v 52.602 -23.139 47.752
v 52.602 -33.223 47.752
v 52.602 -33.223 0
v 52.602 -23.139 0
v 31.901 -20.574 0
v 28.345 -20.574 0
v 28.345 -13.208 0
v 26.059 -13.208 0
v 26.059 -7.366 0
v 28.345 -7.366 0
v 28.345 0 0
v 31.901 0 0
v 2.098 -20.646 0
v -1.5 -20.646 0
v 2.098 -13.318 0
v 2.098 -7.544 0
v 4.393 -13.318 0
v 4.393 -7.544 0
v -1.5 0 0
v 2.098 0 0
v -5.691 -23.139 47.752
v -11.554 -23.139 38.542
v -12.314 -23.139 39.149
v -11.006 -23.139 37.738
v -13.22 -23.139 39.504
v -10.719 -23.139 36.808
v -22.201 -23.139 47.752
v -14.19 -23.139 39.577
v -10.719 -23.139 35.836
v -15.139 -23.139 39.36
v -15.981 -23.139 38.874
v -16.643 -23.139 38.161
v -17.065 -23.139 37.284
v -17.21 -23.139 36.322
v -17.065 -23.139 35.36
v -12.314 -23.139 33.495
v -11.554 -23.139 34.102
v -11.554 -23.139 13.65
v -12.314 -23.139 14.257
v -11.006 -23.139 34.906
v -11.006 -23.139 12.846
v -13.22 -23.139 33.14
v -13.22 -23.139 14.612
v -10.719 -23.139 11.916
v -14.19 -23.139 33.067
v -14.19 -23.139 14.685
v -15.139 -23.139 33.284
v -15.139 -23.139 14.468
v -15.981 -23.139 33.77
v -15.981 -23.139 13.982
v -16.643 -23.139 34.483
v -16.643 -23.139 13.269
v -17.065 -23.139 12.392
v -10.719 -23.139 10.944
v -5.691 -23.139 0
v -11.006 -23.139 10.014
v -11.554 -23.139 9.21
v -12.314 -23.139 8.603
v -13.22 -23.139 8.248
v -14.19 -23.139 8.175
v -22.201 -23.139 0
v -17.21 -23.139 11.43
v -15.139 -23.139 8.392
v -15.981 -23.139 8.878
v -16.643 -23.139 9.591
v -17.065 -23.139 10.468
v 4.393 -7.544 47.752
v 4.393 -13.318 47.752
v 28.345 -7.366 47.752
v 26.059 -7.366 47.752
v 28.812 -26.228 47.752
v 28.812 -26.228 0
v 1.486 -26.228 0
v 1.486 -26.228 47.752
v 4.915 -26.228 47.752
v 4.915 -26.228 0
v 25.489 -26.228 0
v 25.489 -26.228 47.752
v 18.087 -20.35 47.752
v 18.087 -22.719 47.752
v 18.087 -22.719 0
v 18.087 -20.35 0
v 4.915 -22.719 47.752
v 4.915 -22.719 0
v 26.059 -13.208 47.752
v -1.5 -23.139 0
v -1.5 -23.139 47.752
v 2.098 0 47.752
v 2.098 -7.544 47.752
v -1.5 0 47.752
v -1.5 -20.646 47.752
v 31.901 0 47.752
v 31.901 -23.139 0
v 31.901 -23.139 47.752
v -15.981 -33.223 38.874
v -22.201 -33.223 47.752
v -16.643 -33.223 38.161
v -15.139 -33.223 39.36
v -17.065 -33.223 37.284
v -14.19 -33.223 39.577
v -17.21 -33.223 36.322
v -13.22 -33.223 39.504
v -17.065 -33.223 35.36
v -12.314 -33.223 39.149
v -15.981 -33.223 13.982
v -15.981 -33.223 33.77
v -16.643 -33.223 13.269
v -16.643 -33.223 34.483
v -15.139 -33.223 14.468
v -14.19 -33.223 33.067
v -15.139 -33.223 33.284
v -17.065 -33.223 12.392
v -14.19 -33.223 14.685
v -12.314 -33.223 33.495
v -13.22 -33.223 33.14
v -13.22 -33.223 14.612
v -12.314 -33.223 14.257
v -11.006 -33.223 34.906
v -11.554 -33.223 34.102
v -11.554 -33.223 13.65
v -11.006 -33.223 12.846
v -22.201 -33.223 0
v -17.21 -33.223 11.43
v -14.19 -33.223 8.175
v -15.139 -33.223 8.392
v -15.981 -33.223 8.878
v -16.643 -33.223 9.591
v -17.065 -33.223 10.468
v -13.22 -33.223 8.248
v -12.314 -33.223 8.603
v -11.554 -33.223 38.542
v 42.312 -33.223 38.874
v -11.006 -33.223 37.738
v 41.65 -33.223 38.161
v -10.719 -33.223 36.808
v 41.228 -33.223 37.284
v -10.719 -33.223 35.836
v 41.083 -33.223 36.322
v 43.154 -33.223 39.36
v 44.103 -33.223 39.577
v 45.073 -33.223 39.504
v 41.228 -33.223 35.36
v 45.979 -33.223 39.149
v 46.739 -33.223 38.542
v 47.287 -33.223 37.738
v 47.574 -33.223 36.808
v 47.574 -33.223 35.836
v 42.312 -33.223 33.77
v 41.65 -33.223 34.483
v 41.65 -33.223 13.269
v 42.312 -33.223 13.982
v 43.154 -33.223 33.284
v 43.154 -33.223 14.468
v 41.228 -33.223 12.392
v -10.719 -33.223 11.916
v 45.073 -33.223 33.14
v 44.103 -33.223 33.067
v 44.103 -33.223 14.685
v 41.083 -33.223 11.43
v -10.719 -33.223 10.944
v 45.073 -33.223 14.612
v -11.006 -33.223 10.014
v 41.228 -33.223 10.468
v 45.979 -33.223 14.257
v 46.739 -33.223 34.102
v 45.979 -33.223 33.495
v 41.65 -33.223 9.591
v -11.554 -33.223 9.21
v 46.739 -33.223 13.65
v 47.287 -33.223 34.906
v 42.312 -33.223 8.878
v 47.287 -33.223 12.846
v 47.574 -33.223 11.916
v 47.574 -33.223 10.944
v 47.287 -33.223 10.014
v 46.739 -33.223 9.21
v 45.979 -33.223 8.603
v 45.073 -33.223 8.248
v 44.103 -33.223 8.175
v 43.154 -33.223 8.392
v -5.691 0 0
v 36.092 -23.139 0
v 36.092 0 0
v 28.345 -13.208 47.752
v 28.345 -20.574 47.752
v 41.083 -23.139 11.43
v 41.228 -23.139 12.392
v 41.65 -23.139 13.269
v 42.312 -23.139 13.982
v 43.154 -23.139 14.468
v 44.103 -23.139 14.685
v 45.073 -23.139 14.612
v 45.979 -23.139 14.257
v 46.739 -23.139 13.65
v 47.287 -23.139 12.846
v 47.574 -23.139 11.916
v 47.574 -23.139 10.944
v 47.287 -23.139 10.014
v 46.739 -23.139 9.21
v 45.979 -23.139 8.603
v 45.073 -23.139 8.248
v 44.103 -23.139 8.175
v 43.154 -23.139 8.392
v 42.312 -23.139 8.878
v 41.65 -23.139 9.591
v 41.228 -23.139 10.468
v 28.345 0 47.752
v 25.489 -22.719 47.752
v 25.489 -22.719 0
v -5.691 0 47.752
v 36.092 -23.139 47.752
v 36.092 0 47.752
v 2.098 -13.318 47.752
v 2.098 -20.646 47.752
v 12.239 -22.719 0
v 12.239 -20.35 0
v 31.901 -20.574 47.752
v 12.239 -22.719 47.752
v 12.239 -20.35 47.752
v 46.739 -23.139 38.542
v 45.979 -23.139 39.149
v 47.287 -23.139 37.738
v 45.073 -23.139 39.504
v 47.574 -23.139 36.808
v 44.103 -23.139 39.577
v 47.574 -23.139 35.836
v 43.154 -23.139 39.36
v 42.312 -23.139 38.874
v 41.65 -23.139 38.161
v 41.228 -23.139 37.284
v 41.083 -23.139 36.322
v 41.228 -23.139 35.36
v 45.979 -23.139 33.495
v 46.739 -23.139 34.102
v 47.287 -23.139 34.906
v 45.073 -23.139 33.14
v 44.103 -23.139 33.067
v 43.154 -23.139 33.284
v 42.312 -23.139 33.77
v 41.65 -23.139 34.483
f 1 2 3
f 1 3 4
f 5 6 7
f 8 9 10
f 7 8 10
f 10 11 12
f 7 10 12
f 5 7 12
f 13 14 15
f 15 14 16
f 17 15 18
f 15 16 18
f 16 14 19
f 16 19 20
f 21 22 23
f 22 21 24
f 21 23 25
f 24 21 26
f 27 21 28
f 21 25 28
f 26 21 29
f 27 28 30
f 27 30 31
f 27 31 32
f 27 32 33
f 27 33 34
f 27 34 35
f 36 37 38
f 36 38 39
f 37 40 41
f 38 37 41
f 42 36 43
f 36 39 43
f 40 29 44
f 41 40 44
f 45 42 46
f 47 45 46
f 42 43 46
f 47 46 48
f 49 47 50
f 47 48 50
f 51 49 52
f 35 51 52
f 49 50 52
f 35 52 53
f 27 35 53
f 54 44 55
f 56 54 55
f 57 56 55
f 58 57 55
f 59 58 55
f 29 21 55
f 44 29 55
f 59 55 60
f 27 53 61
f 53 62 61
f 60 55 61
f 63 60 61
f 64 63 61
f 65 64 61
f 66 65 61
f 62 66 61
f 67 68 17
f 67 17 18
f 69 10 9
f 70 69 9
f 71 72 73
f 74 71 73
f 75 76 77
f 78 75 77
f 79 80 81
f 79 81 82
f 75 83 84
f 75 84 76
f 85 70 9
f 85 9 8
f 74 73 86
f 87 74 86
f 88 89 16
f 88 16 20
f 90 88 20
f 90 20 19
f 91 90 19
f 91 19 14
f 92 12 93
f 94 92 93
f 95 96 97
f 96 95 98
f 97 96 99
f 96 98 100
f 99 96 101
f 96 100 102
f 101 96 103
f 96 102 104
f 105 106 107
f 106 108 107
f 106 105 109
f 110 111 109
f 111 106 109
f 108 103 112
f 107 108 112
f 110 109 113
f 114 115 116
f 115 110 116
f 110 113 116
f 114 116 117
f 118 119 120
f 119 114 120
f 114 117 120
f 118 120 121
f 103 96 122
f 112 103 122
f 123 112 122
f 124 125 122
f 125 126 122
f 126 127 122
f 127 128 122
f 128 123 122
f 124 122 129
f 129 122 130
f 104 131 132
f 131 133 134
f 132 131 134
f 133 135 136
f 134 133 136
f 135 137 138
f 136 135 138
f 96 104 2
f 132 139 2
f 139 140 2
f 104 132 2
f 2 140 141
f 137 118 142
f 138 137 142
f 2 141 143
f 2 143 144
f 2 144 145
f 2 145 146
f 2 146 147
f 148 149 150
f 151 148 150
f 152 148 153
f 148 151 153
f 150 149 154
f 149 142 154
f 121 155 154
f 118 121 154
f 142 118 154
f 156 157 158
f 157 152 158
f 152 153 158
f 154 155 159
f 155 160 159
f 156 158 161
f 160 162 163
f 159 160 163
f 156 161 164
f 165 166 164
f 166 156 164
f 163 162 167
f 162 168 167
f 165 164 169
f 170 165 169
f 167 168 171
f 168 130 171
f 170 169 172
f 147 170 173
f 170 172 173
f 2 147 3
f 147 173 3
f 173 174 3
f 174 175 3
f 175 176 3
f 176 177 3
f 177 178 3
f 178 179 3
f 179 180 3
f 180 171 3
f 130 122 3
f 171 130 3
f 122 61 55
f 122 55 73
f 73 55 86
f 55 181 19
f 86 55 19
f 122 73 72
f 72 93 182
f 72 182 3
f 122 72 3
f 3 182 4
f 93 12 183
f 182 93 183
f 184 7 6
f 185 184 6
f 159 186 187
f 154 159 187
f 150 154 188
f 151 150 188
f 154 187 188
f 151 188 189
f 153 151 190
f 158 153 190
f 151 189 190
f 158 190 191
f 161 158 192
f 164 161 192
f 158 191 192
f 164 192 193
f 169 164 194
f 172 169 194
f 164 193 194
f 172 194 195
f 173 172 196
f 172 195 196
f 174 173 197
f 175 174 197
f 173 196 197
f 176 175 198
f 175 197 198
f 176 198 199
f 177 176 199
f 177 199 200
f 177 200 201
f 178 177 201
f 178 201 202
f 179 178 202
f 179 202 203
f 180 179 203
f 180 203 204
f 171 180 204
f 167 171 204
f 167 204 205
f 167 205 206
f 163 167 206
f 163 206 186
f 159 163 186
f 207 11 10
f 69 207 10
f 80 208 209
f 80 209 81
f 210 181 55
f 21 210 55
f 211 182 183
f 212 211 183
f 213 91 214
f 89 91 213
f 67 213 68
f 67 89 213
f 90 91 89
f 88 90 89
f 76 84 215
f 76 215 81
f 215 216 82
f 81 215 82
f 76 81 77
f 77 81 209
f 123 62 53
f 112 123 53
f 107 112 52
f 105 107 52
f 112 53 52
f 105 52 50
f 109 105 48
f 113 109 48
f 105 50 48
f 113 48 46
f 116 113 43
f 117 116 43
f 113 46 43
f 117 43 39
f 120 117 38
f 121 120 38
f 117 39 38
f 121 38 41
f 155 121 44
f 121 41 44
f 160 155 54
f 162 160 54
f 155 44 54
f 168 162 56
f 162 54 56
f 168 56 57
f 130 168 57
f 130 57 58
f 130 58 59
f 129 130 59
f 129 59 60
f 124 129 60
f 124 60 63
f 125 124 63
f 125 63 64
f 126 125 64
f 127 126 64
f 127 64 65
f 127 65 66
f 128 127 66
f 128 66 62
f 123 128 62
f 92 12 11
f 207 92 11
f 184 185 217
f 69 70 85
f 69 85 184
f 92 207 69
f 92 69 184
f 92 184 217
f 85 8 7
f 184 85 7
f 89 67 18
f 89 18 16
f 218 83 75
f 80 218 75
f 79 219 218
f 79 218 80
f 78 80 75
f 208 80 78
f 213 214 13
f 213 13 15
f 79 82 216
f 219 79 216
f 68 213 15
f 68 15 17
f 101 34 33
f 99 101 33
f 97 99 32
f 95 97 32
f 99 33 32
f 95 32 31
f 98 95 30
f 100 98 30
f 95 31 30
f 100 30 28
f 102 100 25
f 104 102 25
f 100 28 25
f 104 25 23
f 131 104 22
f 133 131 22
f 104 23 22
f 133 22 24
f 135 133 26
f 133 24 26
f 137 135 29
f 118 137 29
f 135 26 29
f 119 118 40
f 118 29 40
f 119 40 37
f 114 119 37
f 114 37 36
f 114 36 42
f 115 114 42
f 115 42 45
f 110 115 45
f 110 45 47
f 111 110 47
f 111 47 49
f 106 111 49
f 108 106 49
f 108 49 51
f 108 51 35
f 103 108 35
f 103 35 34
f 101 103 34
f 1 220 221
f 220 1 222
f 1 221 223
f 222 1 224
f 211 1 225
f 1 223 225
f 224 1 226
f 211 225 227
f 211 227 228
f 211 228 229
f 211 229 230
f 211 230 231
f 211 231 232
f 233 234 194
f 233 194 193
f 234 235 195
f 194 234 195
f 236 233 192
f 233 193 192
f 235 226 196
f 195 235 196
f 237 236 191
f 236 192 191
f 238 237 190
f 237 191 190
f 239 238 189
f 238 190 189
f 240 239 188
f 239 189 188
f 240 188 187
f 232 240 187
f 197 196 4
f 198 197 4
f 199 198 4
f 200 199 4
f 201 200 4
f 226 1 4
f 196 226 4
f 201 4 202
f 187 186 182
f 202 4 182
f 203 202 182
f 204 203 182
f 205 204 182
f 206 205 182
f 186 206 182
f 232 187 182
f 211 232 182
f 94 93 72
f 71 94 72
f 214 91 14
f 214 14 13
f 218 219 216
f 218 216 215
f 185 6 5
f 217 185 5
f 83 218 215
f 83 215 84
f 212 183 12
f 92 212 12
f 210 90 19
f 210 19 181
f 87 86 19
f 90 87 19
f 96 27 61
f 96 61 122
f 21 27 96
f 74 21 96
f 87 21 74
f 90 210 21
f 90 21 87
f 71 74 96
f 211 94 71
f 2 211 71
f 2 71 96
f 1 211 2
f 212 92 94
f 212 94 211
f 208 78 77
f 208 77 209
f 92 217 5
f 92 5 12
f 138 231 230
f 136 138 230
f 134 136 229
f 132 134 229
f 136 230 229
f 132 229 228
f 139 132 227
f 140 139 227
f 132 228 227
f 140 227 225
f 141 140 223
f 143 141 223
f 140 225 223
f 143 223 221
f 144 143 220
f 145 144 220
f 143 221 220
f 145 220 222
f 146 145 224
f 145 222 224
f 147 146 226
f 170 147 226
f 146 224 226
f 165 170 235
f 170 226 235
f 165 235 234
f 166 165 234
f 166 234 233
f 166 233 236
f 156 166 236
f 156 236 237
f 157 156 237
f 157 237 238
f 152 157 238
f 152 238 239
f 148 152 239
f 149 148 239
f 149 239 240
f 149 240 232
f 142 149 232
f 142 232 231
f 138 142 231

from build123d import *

# Parameters (mm, degrees)
BOSS_EXTRUDE1_DEPTH = 47.752
BOSS_EXTRUDE2_DEPTH = 47.752
BOSS_EXTRUDE3_DEPTH = 47.752
BOSS_EXTRUDE4_DEPTH = 47.752
SKETCH8_R           = 3.2639
CUT_EXTRUDE1_DEPTH  = 127


with BuildPart() as part:
    # Sketch1 → Boss-Extrude1 (new body)
    with BuildSketch(Plane.XY):
        Polygon((-22.201293822, -33.2232), (52.601706178, -33.2232), (52.601706178, -23.1394), (36.091706178, -23.1394), (36.091706178, 0), (31.900706178, 0), (31.900706178, -23.1394), (28.811789902, -26.228316275), (1.486022638, -26.228316275), (-1.500293822, -23.1394), (-1.500293822, 0), (-5.691293822, 0), (-5.691293822, -23.1394), (-22.201293822, -23.1394), align=None)
    extrude(amount=BOSS_EXTRUDE1_DEPTH)

    # Sketch8 → Cut-Extrude1 (cut)
    with BuildSketch(Plane(origin=(0, -23.1394, 0), x_dir=(-1, 0, 0), z_dir=(0, 1, 0))):
        with Locations((13.946293822, 11.43)):
            Circle(SKETCH8_R)
        with Locations((13.946293822, 36.322)):
            Circle(SKETCH8_R)
        with Locations((-44.346706178, 11.43)):
            Circle(SKETCH8_R)
        with Locations((-44.346706178, 36.322)):
            Circle(SKETCH8_R)
    extrude(amount=-CUT_EXTRUDE1_DEPTH, mode=Mode.SUBTRACT)


with BuildPart() as body_2:
    # Sketch2 → Boss-Extrude2 (new body)
    with BuildSketch(Plane(origin=(0, 0, 0), x_dir=(-1, 0, 0), z_dir=(0, 0, -1))):
        Polygon((-31.900706178, 0), (-28.344706178, 0), (-28.344706178, -7.366), (-26.058706178, -7.366), (-26.058706178, -13.208), (-28.344706178, -13.208), (-28.344706178, -20.574), (-31.900706178, -20.574), align=None)
    extrude(amount=-BOSS_EXTRUDE2_DEPTH)


with BuildPart() as body_3:
    # Sketch4 → Boss-Extrude3 (new body)
    with BuildSketch(Plane.XY.offset(47.752)):
        Polygon((-1.500293822, 0), (-1.500293822, -20.645913974), (2.097938777, -20.645913974), (2.097938777, -13.317527122), (4.392686175, -13.317527122), (4.392686175, -7.543646573), (2.097938777, -7.543646573), (2.097938777, 0), align=None)
    extrude(amount=-BOSS_EXTRUDE3_DEPTH)


with BuildPart() as body_4:
    # Sketch5 → Boss-Extrude4 (new body)
    with BuildSketch(Plane.XY.offset(47.752)):
        Polygon((4.915022638, -26.228316275), (25.489022638, -26.228316275), (25.489022638, -22.718589043), (18.087146452, -22.718589043), (18.087146452, -20.349817535), (12.239241793, -20.349817535), (12.239241793, -22.718589043), (4.915022638, -22.718589043), align=None)
    extrude(amount=-BOSS_EXTRUDE4_DEPTH)


solid = Compound([part.part, body_2.part, body_3.part, body_4.part])
